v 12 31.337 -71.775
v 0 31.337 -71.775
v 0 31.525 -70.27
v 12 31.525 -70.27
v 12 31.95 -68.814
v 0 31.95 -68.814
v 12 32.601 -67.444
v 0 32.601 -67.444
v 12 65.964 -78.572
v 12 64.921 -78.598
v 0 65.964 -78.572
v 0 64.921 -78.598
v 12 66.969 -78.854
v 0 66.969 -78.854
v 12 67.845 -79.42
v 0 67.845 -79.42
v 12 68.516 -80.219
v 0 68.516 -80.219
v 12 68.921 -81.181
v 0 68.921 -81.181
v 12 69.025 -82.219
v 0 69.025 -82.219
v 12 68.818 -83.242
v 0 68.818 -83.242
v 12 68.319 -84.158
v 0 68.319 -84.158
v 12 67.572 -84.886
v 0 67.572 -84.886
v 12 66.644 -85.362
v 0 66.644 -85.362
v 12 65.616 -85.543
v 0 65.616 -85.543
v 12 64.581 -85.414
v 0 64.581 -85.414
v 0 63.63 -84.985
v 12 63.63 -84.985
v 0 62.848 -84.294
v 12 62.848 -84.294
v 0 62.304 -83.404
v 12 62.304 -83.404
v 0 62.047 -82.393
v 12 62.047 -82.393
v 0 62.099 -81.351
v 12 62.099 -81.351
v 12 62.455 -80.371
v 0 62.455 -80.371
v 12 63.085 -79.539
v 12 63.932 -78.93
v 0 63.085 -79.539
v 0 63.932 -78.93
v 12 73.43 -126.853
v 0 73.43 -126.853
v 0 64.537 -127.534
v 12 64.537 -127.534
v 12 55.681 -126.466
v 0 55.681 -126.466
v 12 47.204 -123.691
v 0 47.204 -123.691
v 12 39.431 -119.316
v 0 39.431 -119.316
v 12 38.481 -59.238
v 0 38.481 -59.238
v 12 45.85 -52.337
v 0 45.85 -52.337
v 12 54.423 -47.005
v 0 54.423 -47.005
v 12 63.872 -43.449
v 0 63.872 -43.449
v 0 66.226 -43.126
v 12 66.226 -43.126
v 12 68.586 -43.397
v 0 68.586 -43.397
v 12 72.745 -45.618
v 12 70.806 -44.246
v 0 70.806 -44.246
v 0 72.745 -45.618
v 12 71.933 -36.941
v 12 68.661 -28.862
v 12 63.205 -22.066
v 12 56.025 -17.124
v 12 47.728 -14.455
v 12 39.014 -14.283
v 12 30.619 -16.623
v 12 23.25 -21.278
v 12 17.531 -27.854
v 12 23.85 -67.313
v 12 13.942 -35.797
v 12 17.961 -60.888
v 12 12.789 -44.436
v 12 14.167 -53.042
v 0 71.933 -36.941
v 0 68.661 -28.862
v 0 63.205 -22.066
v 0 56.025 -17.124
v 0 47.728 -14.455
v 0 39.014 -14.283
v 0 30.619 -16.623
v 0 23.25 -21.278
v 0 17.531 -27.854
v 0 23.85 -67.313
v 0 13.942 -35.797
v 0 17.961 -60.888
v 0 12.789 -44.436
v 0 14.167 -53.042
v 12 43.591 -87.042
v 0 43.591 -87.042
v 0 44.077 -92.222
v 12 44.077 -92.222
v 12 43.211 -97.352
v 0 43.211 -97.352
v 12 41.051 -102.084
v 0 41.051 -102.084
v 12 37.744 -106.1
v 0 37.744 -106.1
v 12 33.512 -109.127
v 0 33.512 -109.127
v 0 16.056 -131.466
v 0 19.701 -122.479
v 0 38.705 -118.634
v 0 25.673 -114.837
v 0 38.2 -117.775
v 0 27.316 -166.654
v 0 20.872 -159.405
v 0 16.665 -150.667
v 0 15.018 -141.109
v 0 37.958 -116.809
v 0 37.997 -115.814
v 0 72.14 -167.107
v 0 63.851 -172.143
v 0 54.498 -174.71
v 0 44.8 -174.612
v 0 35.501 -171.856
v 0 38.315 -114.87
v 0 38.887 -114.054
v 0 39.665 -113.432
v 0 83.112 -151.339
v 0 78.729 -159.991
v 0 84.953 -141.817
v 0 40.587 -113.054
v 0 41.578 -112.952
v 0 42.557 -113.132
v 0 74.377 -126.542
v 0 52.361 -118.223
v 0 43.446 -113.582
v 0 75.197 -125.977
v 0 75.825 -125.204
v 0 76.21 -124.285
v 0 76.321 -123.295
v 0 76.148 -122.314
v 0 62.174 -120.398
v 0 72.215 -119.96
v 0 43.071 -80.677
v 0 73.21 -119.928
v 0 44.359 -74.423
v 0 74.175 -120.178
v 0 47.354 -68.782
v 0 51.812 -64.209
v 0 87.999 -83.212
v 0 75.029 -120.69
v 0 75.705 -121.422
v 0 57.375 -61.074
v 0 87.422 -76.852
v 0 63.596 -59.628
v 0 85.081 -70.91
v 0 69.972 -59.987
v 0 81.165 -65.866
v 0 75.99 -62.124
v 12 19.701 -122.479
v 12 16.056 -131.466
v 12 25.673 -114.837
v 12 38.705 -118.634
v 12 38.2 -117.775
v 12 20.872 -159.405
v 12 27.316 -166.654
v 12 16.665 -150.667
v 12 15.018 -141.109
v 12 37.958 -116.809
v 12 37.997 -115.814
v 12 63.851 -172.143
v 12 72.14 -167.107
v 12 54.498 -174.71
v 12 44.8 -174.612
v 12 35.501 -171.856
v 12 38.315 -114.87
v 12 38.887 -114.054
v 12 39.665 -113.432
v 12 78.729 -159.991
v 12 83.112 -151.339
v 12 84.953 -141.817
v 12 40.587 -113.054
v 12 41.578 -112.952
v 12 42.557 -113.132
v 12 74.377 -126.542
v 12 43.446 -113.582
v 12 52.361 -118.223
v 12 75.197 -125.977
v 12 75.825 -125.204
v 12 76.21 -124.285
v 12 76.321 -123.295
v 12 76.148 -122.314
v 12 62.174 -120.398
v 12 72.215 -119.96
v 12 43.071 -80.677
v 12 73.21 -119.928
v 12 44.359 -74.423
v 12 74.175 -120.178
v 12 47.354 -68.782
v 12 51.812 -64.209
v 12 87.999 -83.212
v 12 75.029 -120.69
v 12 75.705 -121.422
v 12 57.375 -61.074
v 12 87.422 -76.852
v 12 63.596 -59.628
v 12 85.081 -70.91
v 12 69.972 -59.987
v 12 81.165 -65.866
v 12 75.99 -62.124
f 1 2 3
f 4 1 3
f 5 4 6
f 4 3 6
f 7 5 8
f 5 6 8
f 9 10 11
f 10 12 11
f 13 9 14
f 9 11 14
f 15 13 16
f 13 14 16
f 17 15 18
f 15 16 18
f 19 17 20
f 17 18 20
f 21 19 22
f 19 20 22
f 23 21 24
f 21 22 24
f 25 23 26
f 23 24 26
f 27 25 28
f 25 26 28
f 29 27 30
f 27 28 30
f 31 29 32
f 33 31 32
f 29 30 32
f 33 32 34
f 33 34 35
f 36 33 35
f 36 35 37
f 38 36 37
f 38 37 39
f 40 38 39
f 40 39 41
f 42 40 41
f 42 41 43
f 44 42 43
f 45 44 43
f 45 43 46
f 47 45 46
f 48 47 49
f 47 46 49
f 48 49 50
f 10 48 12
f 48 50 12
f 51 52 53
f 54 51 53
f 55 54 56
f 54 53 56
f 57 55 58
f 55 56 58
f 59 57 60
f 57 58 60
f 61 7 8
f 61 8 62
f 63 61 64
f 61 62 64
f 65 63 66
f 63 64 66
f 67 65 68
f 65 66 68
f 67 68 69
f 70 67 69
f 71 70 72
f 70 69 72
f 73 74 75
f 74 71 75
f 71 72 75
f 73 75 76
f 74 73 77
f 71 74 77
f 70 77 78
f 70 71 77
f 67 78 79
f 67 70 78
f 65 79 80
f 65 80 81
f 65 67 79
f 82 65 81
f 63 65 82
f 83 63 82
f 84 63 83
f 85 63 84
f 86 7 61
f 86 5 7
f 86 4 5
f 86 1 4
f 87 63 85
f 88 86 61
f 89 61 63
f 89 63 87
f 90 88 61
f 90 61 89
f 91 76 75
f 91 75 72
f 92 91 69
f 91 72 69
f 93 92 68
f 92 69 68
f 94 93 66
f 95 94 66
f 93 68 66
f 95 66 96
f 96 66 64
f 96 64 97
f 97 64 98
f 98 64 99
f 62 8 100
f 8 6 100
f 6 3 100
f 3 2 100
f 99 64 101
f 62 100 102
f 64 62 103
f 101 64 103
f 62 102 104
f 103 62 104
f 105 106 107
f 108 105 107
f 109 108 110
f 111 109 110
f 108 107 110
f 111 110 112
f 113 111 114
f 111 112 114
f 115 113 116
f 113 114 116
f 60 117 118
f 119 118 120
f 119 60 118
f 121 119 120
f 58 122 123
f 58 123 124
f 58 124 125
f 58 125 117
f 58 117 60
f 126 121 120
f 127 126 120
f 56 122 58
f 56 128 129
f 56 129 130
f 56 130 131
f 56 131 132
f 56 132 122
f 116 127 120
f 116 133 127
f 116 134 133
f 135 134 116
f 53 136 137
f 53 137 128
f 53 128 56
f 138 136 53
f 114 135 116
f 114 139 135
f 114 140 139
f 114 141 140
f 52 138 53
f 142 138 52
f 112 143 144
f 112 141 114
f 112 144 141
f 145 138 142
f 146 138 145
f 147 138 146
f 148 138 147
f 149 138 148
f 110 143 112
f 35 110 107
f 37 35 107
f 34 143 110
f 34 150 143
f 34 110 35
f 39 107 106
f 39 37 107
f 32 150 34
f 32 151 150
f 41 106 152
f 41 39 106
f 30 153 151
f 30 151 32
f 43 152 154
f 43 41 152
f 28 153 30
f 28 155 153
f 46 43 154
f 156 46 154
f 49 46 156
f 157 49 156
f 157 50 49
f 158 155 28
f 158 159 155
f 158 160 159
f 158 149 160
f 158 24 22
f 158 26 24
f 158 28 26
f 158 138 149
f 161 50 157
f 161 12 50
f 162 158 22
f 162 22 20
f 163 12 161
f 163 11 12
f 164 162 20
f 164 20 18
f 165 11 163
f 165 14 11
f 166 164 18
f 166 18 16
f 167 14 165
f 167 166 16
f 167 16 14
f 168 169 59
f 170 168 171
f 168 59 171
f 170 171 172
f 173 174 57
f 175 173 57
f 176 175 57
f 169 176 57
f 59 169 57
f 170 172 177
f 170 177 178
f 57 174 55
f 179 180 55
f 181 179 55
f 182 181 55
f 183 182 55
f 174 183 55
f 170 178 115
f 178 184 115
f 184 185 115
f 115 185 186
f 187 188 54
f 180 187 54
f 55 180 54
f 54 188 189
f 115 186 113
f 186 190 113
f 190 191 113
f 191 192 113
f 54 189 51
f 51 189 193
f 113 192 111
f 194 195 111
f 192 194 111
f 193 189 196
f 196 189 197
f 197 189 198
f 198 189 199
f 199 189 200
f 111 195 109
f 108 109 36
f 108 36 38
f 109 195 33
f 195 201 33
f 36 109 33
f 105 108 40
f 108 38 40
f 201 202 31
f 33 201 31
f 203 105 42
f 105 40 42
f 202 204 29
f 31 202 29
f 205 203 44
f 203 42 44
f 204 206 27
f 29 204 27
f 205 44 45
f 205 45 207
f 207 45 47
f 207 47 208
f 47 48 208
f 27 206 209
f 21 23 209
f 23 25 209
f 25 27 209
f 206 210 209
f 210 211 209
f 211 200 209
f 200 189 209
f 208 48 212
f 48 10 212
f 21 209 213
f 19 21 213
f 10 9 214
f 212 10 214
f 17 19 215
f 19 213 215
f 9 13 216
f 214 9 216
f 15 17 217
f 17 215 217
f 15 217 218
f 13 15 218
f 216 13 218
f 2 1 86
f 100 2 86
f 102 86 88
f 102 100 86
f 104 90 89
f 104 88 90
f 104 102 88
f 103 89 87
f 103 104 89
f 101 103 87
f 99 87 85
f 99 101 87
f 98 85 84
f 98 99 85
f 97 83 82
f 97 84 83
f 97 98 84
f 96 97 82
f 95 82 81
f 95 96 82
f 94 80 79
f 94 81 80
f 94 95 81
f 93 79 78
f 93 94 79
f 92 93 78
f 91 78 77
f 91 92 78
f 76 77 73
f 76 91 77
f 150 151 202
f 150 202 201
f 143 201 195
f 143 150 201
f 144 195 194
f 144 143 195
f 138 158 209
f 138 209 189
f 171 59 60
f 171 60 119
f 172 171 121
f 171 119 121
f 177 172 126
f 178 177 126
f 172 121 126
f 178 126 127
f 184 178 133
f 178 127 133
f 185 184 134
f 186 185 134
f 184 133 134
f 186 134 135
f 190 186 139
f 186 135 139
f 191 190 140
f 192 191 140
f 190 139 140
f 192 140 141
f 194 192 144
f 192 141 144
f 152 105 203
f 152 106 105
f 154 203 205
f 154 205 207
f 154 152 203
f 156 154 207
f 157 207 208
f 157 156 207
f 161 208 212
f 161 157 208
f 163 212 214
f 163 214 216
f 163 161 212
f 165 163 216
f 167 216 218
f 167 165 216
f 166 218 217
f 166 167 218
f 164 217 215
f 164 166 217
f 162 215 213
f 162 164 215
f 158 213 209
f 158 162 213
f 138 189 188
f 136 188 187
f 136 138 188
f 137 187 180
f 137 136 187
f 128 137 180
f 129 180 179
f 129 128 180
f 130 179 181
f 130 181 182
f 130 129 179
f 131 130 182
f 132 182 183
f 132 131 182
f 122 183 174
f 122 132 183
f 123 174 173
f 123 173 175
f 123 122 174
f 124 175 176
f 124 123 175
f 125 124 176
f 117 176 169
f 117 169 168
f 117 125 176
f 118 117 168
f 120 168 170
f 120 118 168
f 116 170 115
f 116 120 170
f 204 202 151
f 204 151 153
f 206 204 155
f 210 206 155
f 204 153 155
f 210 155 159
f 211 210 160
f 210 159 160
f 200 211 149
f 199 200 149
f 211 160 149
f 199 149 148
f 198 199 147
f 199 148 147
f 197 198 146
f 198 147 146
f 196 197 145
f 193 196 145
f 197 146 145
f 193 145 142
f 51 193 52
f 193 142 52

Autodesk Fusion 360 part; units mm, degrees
sketch "Sketch1" plane through (0, 0, 0) normal (0, 0, 1) x (1, 0, 0) in component "Tensioner Mount Plate"
  line L0 (-29, 0) -> (29, 0)
  line L1 (-29, 0) -> (-29, -38.1)
  circle A0 centre (21, -30.1) radius 3.5
  line L2 (15.9481, -8.1745) -> (-41.2371, -21.3508)
  arc A1 (19.8875, -52.5725) -> (-0.1112, -66.3331) centre (18.8987, -72.548) ccw
  line L3 (29, -38.1) -> (29, 0)
  line L4 (-29, -38.1) -> (29, -38.1)
  line L5 (21, -30.1) -> (-21, -30.1) construction
  line L6 (21, -30.1) -> (-33.3785, -55.4571) construction
  line L7 (-21, -30.1) -> (-29, -30.1) construction
  line L8 (29, -30.1) -> (21, -30.1) construction
  arc A2 (-41.2371, -21.3508) -> (-0.1112, -66.3331) centre (-33.3785, -55.4571) ccw
  arc A3 (19.8875, -52.5725) -> (15.9481, -8.1745) centre (21, -30.1) ccw
  line L9 (21, -30.1) -> (-8.6985, -59.7985) construction
  arc A4 (-20.8635, -26.6027) -> (-6.129, -62.175) centre (21.248, -29.9973) ccw construction
  arc A5 (-17.5, -30.1) -> (-6.2236, -57.3236) centre (21, -30.1) ccw
  arc A6 (-24.5, -30.1) -> (-11.1734, -62.2734) centre (21, -30.1) ccw
  arc A7 (-11.1734, -62.2734) -> (-6.2236, -57.3236) centre (-8.6985, -59.7985) ccw
  arc A8 (-17.5, -30.1) -> (-24.5, -30.1) centre (-21, -30.1) ccw
  dimension "d56_1" = 8
  dimension "d57_1" = 8
  dimension "d58_1" = 7
  dimension "d59_1" = 45
  dimension "d60_1" = 35
  dimension "d61_1" = 20
  dimension "d63_1" = 60
  dimension "d64_1" = 25
  dimension "d65_1" = 45
extrude "Extrude1" add sketch "Sketch1" against normal blind 12 contours L1 L2 L3 L4 A3 A5 A6 A8 | L1 L2 A1 L3 L4 A2 A3 A5 A6 A7 makes body 1 in component "Tensioner Mount Plate"
sketch "Sketch2" plane through (0, 0, -12) normal (0, 0, -1) x (-1, 0, 0) in component "Tensioner"
  circle A0 centre (-21, -30.1) radius 3.5
  arc A1 (24.5, -30.1) -> (17.5, -30.1) centre (21, -30.1) ccw
  arc A2 (11.1734, -62.2734) -> (24.5, -30.1) centre (-21, -30.1) ccw
  arc A3 (6.2236, -57.3236) -> (11.1734, -62.2734) centre (8.6985, -59.7985) ccw
  arc A4 (6.2236, -57.3236) -> (17.5, -30.1) centre (-21, -30.1) ccw
  arc A5 (-15.9481, -8.1745) -> (-19.8875, -52.5725) centre (-21, -30.1) ccw
  arc A6 (0.1112, -66.3331) -> (-19.8875, -52.5725) centre (-18.8987, -72.548) ccw
  arc A7 (0.1112, -66.3331) -> (41.2371, -21.3508) centre (33.3785, -55.4571) ccw
  line L0 (41.2371, -21.3508) -> (-15.9481, -8.1745)
  arc A8 (11.1734, -62.2734) -> (24.5, -30.1) centre (-21, -30.1) ccw
  arc A9 (6.2236, -57.3236) -> (11.1734, -62.2734) centre (8.6985, -59.7985) ccw
  arc A10 (6.2236, -57.3236) -> (17.5, -30.1) centre (-21, -30.1) ccw
  arc A11 (24.5, -30.1) -> (17.5, -30.1) centre (21, -30.1) ccw
  arc A12 (0.1112, -66.3331) -> (41.2371, -21.3508) centre (33.3785, -55.4571) ccw
  line L1 (41.2371, -21.3508) -> (-15.9481, -8.1745)
  arc A13 (-15.9481, -8.1745) -> (-19.8875, -52.5725) centre (-21, -30.1) ccw
  arc A14 (0.1112, -66.3331) -> (-19.8875, -52.5725) centre (-18.8987, -72.548) ccw
  circle A15 centre (-21, -30.1) radius 3.5
  arc A16 (30.5, -30.1) -> (29.4291, -25.7182) centre (21, -30.1) ccw
  arc A17 (6.647, -69.0743) -> (15.416, -66.516) centre (8.6985, -59.7985) ccw
  arc A18 (15.416, -66.516) -> (30.5, -30.1) centre (-21, -30.1) ccw
  arc A19 (6.647, -69.0743) -> (29.4291, -25.7182) centre (33.3785, -55.4571) ccw
  dimension "d68_1" = 60
extrude "Extrude2" add sketch "Sketch2" along normal blind 12 separate body contours A16 A17 A18 A19 makes body 2 in component "Tensioner"
sketch "Sketch1 (2)" plane through (0, 0, 0) normal (1, 0, 0) x (0, 0, -1)
  line L0 (0, 0) -> (609, 0)
  line L1 (609, 0) -> (609, 609)
  line L2 (609, 609) -> (0, 609)
  line L3 (0, 609) -> (0, 0)
  dimension "d1" = 609
  dimension "d2" = 609
extrude "Extrude1'" add sketch "Sketch1 (2)" along normal blind 12 separate body makes body 3
component "Tensioner Mount Plate" placed x (0, -0.173648, 0.984808) y (0, 0.984808, 0.173648) z (-1, 0, 0) at (0, 98.8185, -97.4986)
component "Tensioner" placed x (0, 0.866025, -0.5) y (0, -0.5, -0.866025) z (-1, 0, 0) at (-12, 43.9643, -108.7618)
hidden bodies 3
